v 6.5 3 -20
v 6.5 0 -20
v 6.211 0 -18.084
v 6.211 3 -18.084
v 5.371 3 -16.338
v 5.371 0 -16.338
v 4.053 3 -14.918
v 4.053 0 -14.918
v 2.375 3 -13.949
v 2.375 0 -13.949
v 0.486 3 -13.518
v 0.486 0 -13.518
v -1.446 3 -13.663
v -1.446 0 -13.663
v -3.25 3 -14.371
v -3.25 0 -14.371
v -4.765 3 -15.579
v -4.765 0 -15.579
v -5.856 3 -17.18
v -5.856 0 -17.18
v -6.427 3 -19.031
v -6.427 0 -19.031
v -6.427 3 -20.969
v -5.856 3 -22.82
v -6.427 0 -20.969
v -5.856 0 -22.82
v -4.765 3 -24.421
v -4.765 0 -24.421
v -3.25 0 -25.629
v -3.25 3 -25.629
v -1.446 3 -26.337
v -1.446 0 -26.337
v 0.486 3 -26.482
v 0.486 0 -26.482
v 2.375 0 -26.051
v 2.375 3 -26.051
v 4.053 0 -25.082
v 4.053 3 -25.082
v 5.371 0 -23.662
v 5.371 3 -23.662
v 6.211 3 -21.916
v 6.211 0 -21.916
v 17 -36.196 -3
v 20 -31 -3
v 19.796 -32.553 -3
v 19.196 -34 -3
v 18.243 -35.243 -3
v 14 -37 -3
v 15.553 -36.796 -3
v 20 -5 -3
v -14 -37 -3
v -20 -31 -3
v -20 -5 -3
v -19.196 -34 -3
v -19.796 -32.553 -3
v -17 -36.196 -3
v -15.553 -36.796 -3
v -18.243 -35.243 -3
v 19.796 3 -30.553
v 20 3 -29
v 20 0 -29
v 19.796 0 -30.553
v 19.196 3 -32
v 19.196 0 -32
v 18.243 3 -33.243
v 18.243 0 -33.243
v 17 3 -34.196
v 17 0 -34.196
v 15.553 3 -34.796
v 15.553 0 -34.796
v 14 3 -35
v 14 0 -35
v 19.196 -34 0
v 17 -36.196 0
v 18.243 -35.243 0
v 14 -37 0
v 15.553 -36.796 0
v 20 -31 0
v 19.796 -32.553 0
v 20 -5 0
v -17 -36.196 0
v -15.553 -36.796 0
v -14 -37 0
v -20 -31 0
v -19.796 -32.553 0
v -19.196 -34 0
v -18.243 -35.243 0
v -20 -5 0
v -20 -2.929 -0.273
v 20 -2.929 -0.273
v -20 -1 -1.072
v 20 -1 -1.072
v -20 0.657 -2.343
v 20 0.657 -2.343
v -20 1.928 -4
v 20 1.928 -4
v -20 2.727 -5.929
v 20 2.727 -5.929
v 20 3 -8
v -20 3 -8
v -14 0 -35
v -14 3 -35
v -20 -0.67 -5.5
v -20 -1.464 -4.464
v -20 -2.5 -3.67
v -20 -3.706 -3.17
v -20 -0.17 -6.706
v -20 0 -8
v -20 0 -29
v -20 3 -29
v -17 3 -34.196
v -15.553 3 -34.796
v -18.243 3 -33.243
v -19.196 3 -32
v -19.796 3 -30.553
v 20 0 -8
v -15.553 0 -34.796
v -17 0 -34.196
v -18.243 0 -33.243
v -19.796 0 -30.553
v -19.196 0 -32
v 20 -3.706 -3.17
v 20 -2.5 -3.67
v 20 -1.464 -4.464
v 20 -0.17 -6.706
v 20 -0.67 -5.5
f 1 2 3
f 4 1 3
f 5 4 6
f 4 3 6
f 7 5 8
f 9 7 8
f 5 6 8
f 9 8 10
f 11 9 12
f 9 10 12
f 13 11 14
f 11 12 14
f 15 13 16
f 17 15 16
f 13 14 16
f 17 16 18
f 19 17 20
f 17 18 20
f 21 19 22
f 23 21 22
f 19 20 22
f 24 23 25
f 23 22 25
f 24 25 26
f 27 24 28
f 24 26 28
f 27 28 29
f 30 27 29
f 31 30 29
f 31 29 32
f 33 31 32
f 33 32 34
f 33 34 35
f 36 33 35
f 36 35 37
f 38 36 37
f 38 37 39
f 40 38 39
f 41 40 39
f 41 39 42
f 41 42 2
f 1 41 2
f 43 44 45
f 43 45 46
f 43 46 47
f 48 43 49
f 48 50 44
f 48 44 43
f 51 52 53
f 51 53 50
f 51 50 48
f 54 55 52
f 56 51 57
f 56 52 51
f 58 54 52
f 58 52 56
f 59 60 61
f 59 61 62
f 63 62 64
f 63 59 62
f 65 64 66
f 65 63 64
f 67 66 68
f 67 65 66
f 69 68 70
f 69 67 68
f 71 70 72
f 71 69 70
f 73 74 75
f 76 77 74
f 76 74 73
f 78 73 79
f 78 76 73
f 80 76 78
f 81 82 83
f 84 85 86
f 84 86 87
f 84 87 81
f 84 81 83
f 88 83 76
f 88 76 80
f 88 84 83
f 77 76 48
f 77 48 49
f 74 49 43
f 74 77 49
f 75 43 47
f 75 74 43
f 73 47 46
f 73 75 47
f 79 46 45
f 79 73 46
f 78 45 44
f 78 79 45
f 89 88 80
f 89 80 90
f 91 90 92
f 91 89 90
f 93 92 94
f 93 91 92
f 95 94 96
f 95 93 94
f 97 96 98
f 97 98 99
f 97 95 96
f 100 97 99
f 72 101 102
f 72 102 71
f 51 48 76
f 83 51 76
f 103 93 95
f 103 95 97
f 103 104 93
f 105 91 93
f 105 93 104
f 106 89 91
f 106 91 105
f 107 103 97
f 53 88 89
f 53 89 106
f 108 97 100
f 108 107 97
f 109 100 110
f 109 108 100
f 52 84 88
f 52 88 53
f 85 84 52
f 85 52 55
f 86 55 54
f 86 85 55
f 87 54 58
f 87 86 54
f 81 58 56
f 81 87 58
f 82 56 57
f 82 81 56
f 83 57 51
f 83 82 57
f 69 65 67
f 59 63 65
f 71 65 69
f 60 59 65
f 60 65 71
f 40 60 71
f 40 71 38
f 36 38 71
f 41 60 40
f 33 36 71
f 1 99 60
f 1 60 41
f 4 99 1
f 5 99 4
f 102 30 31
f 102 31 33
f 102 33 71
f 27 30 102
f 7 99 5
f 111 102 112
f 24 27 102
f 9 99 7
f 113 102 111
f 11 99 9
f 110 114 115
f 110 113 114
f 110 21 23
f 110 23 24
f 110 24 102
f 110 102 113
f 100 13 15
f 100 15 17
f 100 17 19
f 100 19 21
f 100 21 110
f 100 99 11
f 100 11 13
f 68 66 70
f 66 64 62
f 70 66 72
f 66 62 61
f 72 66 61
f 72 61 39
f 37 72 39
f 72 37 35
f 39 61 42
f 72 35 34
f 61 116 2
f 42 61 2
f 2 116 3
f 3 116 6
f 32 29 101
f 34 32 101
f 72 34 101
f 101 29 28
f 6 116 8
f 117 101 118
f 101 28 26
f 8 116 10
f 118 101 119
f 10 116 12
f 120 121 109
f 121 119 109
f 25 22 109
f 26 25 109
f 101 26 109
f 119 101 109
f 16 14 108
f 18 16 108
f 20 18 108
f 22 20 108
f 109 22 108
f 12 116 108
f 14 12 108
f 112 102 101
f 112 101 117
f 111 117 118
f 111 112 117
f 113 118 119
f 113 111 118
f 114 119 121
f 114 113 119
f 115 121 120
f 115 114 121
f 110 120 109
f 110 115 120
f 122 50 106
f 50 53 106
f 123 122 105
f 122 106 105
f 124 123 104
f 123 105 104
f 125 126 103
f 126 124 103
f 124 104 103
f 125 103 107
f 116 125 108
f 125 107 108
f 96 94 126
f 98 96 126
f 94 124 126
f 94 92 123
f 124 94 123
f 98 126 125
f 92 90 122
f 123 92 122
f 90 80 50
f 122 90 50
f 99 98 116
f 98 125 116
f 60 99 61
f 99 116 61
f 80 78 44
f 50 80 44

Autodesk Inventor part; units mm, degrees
ref_plane "YZ Plane" through (0, 0, 0) normal (1, 0, 0) x (0, 1, 0)
ref_plane "XZ Plane" through (0, 0, 0) normal (0, 1, 0) x (-1, 0, 0)
ref_plane "XY Plane" through (0, 0, 0) normal (0, 0, 1) x (1, 0, 0)
sketch "Sketch4" plane through (0, 0, 0) normal (0, 1, 0) x (-1, 0, 0)
  line L0 (20, -35) -> (-20, -35)
  line L1 (-20, -35) -> (-20, 0)
  line L2 (-20, 0) -> (20, 0)
  line L3 (20, 0) -> (20, -35)
  point P0 (0, 0)
  point P1 (0, 0)
  dimension "d36" = 40
  dimension "d37" = 35
extrude "Plate2" add sketch "Sketch4" along normal blind 3
sketch "Sketch5" plane through (0, 0, 0) normal (0, -1, 0) x (1, 0, 0)
  circle A0 centre (0, -20) radius 6.5
  line L0 (0, 0) -> (0, -35) construction
  line L1 (20, -35) -> (-20, -35) construction
  dimension "d40" = 15
  dimension "d41" = 13
extrude "Cut1" cut sketch "Sketch5" against normal blind 3
sketch "Sketch6" plane through (-20, 3, -3) normal (0, 0, 1) x (1, 0, 0)
  line L0 (40, 0) -> (0, 0)
  line L1 (0, 0) -> (0, -40)
  line L2 (0, -40) -> (40, -40)
  line L3 (40, -40) -> (40, 0)
edge flange "Flange1" height 40 angle 90 thickness 3 bend radius 5 thickness toward (0, 0, 1) relief round relief width 3 relief depth 1.5 edges at (0, 0, 0) wall of the first edge with corners at (20, 3, -3) (-20, 3, -3) (-20, -37, -3) (20, -37, -3)
bend "Bend1"
corner "Corner1"
fillet "Corner Round6" radius 6 4 edges at (20, -37, -1.5) (-20, 1.5, -35) (20, 1.5, -35) (-20, -37, -1.5)
equation "\"d42\" = Thickness"
equation "\"d38\" = Thickness"
equation "\"d44\" = BendReliefWidth"
equation "\"d45\" = BendReliefDepth"
equation "\"d46\" = MinimumRemnant"
equation "\"d47\" = TransitionRadius"
equation "\"d50\" = BendRadius"
equation "\"d51\" = CornerReliefSize"
equation "\"d52\" = GapSize"
equation "\"d53\" = JacobiRadiusSize"
equation "\"BendReliefWidth\" = Thickness"
equation "\"BendReliefDepth\" = 0.5 * Thickness"
equation "\"CornerReliefSize\" = 4 * Thickness"
equation "\"MinimumRemnant\" = 2 * Thickness"
equation "\"TransitionRadius\" = BendRadius"
equation "\"JacobiRadiusSize\" = BendRadius"
equation "\"GapSize\" = Thickness"
equation "\"Thickness\" = 3"
equation "\"BendRadius\" = 5"
properties part number "NDM-VOS 913 flange bolt" material "Stainless Steel"
